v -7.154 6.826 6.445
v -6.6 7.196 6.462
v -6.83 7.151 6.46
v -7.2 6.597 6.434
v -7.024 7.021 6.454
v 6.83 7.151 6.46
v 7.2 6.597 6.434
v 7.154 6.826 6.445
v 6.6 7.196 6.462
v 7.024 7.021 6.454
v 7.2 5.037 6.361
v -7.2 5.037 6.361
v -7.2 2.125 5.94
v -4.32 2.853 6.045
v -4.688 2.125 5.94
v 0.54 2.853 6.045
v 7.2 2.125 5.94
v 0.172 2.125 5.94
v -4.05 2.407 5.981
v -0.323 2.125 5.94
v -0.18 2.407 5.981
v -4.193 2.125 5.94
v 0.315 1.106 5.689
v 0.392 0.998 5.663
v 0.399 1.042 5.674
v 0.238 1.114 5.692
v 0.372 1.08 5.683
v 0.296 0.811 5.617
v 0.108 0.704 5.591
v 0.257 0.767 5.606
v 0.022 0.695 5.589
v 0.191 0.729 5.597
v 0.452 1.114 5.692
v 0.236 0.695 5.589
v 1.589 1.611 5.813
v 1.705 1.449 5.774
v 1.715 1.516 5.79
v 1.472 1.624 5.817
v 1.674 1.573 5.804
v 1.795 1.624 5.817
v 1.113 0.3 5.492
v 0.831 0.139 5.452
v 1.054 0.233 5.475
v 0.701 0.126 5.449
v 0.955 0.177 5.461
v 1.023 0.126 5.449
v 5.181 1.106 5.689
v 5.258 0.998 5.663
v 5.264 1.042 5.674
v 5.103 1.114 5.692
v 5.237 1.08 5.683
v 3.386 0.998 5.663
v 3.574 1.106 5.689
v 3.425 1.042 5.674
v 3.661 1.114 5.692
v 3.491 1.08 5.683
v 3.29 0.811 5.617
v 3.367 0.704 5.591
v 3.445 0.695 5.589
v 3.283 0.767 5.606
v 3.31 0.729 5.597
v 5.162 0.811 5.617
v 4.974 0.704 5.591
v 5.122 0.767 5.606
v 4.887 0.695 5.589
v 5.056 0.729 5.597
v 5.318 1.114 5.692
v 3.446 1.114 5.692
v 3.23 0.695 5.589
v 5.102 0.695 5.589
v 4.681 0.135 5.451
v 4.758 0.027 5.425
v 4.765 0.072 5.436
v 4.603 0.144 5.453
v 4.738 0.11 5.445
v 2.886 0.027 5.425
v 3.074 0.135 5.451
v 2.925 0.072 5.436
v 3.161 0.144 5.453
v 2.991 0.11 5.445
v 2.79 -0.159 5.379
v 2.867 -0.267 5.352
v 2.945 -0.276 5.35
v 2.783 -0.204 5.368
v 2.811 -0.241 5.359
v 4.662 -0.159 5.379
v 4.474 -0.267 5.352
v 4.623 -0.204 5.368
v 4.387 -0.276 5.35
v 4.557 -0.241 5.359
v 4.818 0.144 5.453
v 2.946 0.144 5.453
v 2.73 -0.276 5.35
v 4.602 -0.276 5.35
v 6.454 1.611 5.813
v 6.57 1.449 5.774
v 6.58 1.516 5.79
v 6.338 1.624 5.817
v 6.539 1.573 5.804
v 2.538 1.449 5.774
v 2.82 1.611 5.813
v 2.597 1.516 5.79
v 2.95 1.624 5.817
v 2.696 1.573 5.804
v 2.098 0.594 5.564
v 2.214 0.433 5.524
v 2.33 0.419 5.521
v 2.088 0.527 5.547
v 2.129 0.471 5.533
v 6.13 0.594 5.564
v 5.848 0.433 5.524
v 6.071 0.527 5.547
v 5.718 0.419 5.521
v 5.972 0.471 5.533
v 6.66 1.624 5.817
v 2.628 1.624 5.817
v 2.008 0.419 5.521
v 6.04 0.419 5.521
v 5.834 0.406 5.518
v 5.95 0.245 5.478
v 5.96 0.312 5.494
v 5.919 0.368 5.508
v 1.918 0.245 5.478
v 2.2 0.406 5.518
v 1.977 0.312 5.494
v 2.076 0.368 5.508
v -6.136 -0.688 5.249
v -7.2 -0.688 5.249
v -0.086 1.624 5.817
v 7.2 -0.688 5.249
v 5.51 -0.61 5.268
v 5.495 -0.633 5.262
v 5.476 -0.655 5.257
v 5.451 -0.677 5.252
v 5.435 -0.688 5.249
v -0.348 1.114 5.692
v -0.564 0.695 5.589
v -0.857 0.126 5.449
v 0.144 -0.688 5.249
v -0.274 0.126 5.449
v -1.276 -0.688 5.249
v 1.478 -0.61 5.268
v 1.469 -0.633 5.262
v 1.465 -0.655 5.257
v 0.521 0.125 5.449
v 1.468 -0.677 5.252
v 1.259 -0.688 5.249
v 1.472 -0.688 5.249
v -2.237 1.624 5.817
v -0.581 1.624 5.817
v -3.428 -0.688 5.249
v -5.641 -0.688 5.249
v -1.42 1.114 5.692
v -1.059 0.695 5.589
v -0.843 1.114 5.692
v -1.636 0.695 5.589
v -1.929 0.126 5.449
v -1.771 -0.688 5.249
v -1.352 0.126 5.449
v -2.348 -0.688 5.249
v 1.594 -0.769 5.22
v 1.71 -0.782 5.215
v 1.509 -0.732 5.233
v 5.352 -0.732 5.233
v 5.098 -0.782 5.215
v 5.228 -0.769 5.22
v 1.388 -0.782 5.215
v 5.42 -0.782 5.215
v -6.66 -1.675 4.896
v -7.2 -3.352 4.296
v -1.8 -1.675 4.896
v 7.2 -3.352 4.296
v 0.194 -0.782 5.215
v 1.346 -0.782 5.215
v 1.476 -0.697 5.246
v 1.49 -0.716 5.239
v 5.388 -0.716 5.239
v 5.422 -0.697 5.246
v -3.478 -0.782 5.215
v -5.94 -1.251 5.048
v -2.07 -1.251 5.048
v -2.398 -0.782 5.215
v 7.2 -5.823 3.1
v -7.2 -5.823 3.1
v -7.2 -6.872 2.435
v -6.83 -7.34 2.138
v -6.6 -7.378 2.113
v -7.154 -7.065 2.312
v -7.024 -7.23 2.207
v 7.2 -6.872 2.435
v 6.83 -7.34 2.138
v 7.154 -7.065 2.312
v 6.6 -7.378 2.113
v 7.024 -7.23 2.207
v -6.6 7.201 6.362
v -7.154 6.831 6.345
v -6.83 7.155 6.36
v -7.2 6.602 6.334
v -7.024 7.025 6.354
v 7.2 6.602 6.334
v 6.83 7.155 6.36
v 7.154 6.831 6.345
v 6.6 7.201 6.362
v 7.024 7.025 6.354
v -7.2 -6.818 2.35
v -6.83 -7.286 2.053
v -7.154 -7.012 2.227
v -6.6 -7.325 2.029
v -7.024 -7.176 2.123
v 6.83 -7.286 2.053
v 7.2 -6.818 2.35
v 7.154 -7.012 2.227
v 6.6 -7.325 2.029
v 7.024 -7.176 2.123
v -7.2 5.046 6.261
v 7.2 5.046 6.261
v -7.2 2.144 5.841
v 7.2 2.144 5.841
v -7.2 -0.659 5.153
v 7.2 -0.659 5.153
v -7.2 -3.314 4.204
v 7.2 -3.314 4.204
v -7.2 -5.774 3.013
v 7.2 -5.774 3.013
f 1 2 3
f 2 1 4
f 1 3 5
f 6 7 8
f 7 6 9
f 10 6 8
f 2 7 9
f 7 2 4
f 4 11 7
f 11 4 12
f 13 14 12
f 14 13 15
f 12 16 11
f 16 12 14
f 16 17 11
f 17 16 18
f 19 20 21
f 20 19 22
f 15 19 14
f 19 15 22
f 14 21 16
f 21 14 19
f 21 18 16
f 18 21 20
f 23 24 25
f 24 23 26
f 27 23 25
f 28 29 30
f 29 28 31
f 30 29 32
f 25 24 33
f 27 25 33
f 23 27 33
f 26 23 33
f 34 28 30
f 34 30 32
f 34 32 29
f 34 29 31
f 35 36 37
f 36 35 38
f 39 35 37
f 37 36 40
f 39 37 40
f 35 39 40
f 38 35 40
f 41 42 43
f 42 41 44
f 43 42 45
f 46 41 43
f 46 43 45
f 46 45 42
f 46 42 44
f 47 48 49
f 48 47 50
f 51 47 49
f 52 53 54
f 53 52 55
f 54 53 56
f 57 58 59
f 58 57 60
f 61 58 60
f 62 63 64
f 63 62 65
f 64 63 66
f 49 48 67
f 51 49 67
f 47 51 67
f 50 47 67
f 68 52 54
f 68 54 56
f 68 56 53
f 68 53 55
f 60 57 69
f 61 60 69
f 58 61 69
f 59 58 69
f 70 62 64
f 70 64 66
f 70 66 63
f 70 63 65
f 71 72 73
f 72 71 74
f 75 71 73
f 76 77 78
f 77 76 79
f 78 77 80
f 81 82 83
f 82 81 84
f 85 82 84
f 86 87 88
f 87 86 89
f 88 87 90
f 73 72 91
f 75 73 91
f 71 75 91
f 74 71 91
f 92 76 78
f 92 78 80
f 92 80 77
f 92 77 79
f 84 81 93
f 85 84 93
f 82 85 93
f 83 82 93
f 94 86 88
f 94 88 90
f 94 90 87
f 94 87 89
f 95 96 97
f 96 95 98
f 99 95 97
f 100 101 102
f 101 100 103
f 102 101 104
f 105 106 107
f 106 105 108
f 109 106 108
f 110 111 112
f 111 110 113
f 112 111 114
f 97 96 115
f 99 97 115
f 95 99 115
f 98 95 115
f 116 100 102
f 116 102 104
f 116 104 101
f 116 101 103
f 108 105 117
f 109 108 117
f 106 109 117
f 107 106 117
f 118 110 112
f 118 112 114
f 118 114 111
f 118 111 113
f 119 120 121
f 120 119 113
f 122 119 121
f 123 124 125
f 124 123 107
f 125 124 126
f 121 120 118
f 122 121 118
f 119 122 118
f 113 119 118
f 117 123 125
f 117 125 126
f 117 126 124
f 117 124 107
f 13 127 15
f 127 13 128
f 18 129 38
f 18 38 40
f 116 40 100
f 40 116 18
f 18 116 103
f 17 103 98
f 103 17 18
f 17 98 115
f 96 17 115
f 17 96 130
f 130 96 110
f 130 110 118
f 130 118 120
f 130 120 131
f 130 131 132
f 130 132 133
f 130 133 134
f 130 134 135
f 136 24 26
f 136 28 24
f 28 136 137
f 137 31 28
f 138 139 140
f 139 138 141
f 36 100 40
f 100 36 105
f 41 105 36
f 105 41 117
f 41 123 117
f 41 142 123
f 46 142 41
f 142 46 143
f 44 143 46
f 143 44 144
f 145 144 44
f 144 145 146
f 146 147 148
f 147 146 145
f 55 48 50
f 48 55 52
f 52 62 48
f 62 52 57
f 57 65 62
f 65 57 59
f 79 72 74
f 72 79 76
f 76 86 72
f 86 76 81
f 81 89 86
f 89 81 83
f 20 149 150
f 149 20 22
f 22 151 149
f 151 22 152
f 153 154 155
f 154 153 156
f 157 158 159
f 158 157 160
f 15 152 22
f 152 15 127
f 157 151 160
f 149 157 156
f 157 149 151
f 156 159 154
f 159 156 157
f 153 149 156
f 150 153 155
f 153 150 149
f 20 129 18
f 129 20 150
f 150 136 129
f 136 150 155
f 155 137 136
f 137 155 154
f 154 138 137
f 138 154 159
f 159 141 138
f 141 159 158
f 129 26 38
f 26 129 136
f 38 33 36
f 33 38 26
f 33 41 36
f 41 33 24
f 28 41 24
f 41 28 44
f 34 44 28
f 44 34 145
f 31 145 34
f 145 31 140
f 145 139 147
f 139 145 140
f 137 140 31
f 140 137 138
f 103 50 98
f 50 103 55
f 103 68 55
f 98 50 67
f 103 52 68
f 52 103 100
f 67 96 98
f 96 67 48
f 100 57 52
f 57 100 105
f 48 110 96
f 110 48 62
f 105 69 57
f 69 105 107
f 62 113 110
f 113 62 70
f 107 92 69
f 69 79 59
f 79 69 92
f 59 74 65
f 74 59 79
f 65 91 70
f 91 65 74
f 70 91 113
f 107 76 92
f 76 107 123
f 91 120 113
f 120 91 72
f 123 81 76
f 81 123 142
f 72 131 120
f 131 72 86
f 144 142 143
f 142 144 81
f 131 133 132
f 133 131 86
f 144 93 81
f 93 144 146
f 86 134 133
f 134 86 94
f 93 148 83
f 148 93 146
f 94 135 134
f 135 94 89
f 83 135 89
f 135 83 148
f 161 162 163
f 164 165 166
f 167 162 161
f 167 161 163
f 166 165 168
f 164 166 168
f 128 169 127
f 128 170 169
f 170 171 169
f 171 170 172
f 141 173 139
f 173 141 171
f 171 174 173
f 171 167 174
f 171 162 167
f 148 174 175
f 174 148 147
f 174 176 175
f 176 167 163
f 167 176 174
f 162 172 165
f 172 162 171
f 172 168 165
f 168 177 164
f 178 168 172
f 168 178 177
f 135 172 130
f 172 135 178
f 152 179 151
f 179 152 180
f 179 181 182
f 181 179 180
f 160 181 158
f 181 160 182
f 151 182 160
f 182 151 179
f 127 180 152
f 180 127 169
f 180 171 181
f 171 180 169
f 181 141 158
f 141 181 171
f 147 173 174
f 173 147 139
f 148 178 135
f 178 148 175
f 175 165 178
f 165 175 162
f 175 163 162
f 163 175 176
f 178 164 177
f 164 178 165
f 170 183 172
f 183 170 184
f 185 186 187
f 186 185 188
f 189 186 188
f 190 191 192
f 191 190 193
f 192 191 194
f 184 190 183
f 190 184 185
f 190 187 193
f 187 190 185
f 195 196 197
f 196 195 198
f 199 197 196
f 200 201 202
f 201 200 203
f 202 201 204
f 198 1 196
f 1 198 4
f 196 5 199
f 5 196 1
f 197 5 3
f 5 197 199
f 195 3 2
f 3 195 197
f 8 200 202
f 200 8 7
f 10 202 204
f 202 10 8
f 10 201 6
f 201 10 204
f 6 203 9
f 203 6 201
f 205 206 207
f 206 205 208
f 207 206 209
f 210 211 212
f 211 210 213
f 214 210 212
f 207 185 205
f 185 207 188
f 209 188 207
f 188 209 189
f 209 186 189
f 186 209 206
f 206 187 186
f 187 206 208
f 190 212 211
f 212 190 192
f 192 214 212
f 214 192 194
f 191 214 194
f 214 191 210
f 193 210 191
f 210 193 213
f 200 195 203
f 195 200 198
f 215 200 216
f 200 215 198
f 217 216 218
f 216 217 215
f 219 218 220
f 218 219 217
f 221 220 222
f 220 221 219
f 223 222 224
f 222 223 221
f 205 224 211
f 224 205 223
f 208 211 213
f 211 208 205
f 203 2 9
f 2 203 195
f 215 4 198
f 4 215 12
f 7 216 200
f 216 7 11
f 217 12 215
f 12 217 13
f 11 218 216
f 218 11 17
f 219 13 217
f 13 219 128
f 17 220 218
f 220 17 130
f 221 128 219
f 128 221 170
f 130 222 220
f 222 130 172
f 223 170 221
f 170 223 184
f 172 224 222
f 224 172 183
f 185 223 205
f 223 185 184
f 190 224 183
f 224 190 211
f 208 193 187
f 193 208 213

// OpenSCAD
// file: ../p/1-4cyli.scad
use <../lib.scad>
function ldraw_lib__1_4cyli() = [
// 0 Cylinder 0.25
// 0 Name: 1-4cyli.dat
// 0 Author: James Jessiman
// 0 !LDRAW_ORG Primitive UPDATE 2012-01
// 0 !LICENSE Licensed under CC BY 4.0 : see CAreadme.txt
// 
// 0 BFC CERTIFY CCW
  [0,"BFC","CERTIFY"],
  [0,"BFC","CCW"],
// 
// 0 !HISTORY 2002-03-23 [sbliss] Added BFC statement.
// 0 !HISTORY 2002-04-25 [PTadmin] Official Update 2002-02
// 0 !HISTORY 2007-06-22 [PTadmin] Header formatted for Contributor Agreement
// 0 !HISTORY 2008-07-01 [PTadmin] Official Update 2008-01
// 0 !HISTORY 2012-02-16 [Philo] Changed to CCW
// 0 !HISTORY 2012-03-30 [PTadmin] Official Update 2012-01
// 
// 
// 4 16 1 1 0 0.9239 1 0.3827 0.9239 0 0.3827 1 0 0
  [4,16,1,1,0,0.9239,1,0.3827,0.9239,0,0.3827,1,0,0],
// 5 24 1 0 0 1 1 0 0.9239 0 0.3827 1 0 -1
  [5,24,1,0,0,1,1,0,0.9239,0,0.3827,1,0,-1],
// 4 16 0.9239 1 0.3827 0.7071 1 0.7071 0.7071 0 0.7071 0.9239 0 0.3827
  [4,16,0.9239,1,0.3827,0.7071,1,0.7071,0.7071,0,0.7071,0.9239,0,0.3827],
// 5 24 0.9239 0 0.3827 0.9239 1 0.3827 0.7071 0 0.7071 1 0 0
  [5,24,0.9239,0,0.3827,0.9239,1,0.3827,0.7071,0,0.7071,1,0,0],
// 4 16 0.7071 1 0.7071 0.3827 1 0.9239 0.3827 0 0.9239 0.7071 0 0.7071
  [4,16,0.7071,1,0.7071,0.3827,1,0.9239,0.3827,0,0.9239,0.7071,0,0.7071],
// 5 24 0.7071 0 0.7071 0.7071 1 0.7071 0.3827 0 0.9239 0.9239 0 0.3827
  [5,24,0.7071,0,0.7071,0.7071,1,0.7071,0.3827,0,0.9239,0.9239,0,0.3827],
// 4 16 0.3827 1 0.9239 0 1 1 0 0 1 0.3827 0 0.9239
  [4,16,0.3827,1,0.9239,0,1,1,0,0,1,0.3827,0,0.9239],
// 5 24 0.3827 0 0.9239 0.3827 1 0.9239 0 0 1 0.7071 0 0.7071
  [5,24,0.3827,0,0.9239,0.3827,1,0.9239,0,0,1,0.7071,0,0.7071],
// 5 24 0 0 1 0 1 1 0.3827 0 0.9239 -1 0 1
  [5,24,0,0,1,0,1,1,0.3827,0,0.9239,-1,0,1],
];
module ldraw_lib__1_4cyli(step=0, col=false, unit=2/5, alt=false, line=0.2, solid=!$preview)
    makepoly(ldraw_lib__1_4cyli(), step=step, col=col, unit=unit, alt=alt, line=line, solid=solid);
ldraw_lib__1_4cyli(line=0.2);
// file: ../p/1-8ndis.scad
use <../lib.scad>
function ldraw_lib__1_8ndis() = [
// 0 Disc Negative 0.125
// 0 Name: 1-8ndis.dat
// 0 Author: James Jessiman
// 0 !LDRAW_ORG Primitive UPDATE 2012-01
// 0 !LICENSE Licensed under CC BY 4.0 : see CAreadme.txt
// 
// 0 BFC CERTIFY CCW
  [0,"BFC","CERTIFY"],
  [0,"BFC","CCW"],
// 
// 0 !HISTORY 2002-03-23 [sbliss] Added BFC statement
// 0 !HISTORY 2002-04-25 [PTadmin] Official Update 2002-02
// 0 !HISTORY 2007-06-22 [PTadmin] Header formatted for Contributor Agreement
// 0 !HISTORY 2008-07-01 [PTadmin] Official Update 2008-01
// 0 !HISTORY 2012-02-16 [Philo] Changed to CCW
// 0 !HISTORY 2012-03-30 [PTadmin] Official Update 2012-01
// 
// 
// 3 16 0.9239 0 0.3827 1 0 0 1 0 1
  [3,16,0.9239,0,0.3827,1,0,0,1,0,1],
// 3 16 0.7071 0 0.7071 0.9239 0 0.3827 1 0 1
  [3,16,0.7071,0,0.7071,0.9239,0,0.3827,1,0,1],
];
module ldraw_lib__1_8ndis(step=0, col=false, unit=2/5, alt=false, line=0.2, solid=!$preview)
    makepoly(ldraw_lib__1_8ndis(), step=step, col=col, unit=unit, alt=alt, line=line, solid=solid);
ldraw_lib__1_8ndis(line=0.2);
// file: ../p/1-8chrd.scad
use <../lib.scad>
function ldraw_lib__1_8chrd() = [
// 0 Chord 0.125
// 0 Name: 1-8chrd.dat
// 0 Author: Orion Pobursky [OrionP]
// 0 !LDRAW_ORG Primitive UPDATE 2023-05
// 0 !LICENSE Licensed under CC BY 4.0 : see CAreadme.txt
// 
// 0 BFC CERTIFY CCW
  [0,"BFC","CERTIFY"],
  [0,"BFC","CCW"],
// 
// 0 !HISTORY 2004-04-22 [PTadmin] Official Update 2004-02
// 0 !HISTORY 2007-06-22 [PTadmin] Header formatted for Contributor Agreement
// 0 !HISTORY 2008-07-01 [PTadmin] Official Update 2008-01
// 0 !HISTORY 2023-10-27 [OrionP] Rebuilt with PrimGen2, original author westrate
// 0 !HISTORY 2023-10-31 [OrionP] Official Update 2023-05
// 
// 3 16 1 0 0 0.9239 0 0.3827 0.7071 0 0.7071
  [3,16,1,0,0,0.9239,0,0.3827,0.7071,0,0.7071],
];
module ldraw_lib__1_8chrd(step=0, col=false, unit=2/5, alt=false, line=0.2, solid=!$preview)
    makepoly(ldraw_lib__1_8chrd(), step=step, col=col, unit=unit, alt=alt, line=line, solid=solid);
ldraw_lib__1_8chrd(line=0.2);
// file: ../p/1-4ndis.scad
use <../lib.scad>
function ldraw_lib__1_4ndis() = [
// 0 Disc Negative 0.25
// 0 Name: 1-4ndis.dat
// 0 Author: James Jessiman
// 0 !LDRAW_ORG Primitive UPDATE 2012-01
// 0 !LICENSE Licensed under CC BY 4.0 : see CAreadme.txt
// 
// 0 BFC CERTIFY CCW
  [0,"BFC","CERTIFY"],
  [0,"BFC","CCW"],
// 
// 0 !HISTORY 2002-03-23 [sbliss] Added BFC Statement
// 0 !HISTORY 2002-04-25 [PTadmin] Official Update 2002-02
// 0 !HISTORY 2007-06-22 [PTadmin] Header formatted for Contributor Agreement
// 0 !HISTORY 2008-07-01 [PTadmin] Official Update 2008-01
// 0 !HISTORY 2012-02-16 [Philo] Changed to CCW
// 0 !HISTORY 2012-03-30 [PTadmin] Official Update 2012-01
// 
// 
// 3 16 0.9239 0 0.3827 1 0 0 1 0 1
  [3,16,0.9239,0,0.3827,1,0,0,1,0,1],
// 3 16 0.7071 0 0.7071 0.9239 0 0.3827 1 0 1
  [3,16,0.7071,0,0.7071,0.9239,0,0.3827,1,0,1],
// 3 16 0.3827 0 0.9239 0.7071 0 0.7071 1 0 1
  [3,16,0.3827,0,0.9239,0.7071,0,0.7071,1,0,1],
// 3 16 0 0 1 0.3827 0 0.9239 1 0 1
  [3,16,0,0,1,0.3827,0,0.9239,1,0,1],
];
module ldraw_lib__1_4ndis(step=0, col=false, unit=2/5, alt=false, line=0.2, solid=!$preview)
    makepoly(ldraw_lib__1_4ndis(), step=step, col=col, unit=unit, alt=alt, line=line, solid=solid);
ldraw_lib__1_4ndis(line=0.2);
// file: ../p/1-4chrd.scad
use <../lib.scad>
function ldraw_lib__1_4chrd() = [
// 0 Chord 0.25
// 0 Name: 1-4chrd.dat
// 0 Author: Max Martin Richter [MMR1988]
// 0 !LDRAW_ORG Primitive UPDATE 2023-05
// 0 !LICENSE Licensed under CC BY 4.0 : see CAreadme.txt
// 
// 0 BFC CERTIFY CCW
  [0,"BFC","CERTIFY"],
  [0,"BFC","CCW"],
// 
// 0 !HISTORY 2004-04-22 [PTadmin] Official Update 2004-02
// 0 !HISTORY 2007-10-09 [PTadmin] Header formatted for Contributor Agreement
// 0 !HISTORY 2008-07-01 [PTadmin] Official Update 2008-01
// 0 !HISTORY 2012-08-02 [MMR1988] Re-creation with PrimGen2 and Rectifier
// 0 !HISTORY 2012-08-09 [PTadmin] Official Update 2012-02
// 0 !HISTORY 2023-10-27 [OrionP] Change author to MMR1988 from hafhead
// 0 !HISTORY 2023-10-31 [OrionP] Official Update 2023-05
// 
// 4 16 0.9239 0 0.3827 0.3827 0 0.9239 0 0 1 1 0 0
  [4,16,0.9239,0,0.3827,0.3827,0,0.9239,0,0,1,1,0,0],
// 3 16 0.7071 0 0.7071 0.3827 0 0.9239 0.9239 0 0.3827
  [3,16,0.7071,0,0.7071,0.3827,0,0.9239,0.9239,0,0.3827],
];
module ldraw_lib__1_4chrd(step=0, col=false, unit=2/5, alt=false, line=0.2, solid=!$preview)
    makepoly(ldraw_lib__1_4chrd(), step=step, col=col, unit=unit, alt=alt, line=line, solid=solid);
ldraw_lib__1_4chrd(line=0.2);
// file: s/6142271fs05.scad
use <../../lib.scad>
use <../../p/1-4chrd.scad>
function ldraw_lib__s__6142271fs05() = [
// 0 ~Sticker  1.9 x  .8 with Red and White R8 Logo on Black Background - Sixth Face
// 0 Name: s\6142271fs05.dat
// 0 Author: Massimo Maso [Sirio]
// 0 !LDRAW_ORG Subpart UPDATE 2025-02
// 0 !LICENSE Licensed under CC BY 4.0 : see CAreadme.txt
// 
// 0 BFC CERTIFY CCW
  [0,"BFC","CERTIFY"],
  [0,"BFC","CCW"],
// 
// 0 !HISTORY 2025-02-27 [OrionP] Official Update 2025-02
// 
// 
// 0 // Primitives
// 1 0 -16.5 -.25 -3.0901 -1.5 0 0 0 1 0 0 0 -1.5 1-4chrd.dat
  [1,0,-16.5,-.25,-3.0901,-1.5,0,0,0,1,0,0,0,-1.5, ldraw_lib__1_4chrd()],
// 1 0 16.5 -.25 -3.0901 1.5 0 0 0 1 0 0 0 -1.5 1-4chrd.dat
  [1,0,16.5,-.25,-3.0901,1.5,0,0,0,1,0,0,0,-1.5, ldraw_lib__1_4chrd()],
// 0 // Black faces
// 4 0 -18 -.25 -3.0901 18 -.25 -3.0901 18 -.25 .0144 -18 -.25 .0144
  [4,0,-18,-.25,-3.0901,18,-.25,-3.0901,18,-.25,.0144,-18,-.25,.0144],
// 4 0 -18 -.25 -3.0901 -16.5 -.25 -4.5901 16.5 -.25 -4.5901 18 -.25 -3.0901
  [4,0,-18,-.25,-3.0901,-16.5,-.25,-4.5901,16.5,-.25,-4.5901,18,-.25,-3.0901],
];
module ldraw_lib__s__6142271fs05(step=0, col=false, unit=2/5, alt=false, line=0.2, solid=!$preview)
    makepoly(ldraw_lib__s__6142271fs05(), step=step, col=col, unit=unit, alt=alt, line=line, solid=solid);
ldraw_lib__s__6142271fs05(line=0.2);
// file: s/6142271fs04.scad
use <../../lib.scad>
use <../../p/1-8chrd.scad>
use <../../p/1-8ndis.scad>
function ldraw_lib__s__6142271fs04() = [
// 0 ~Sticker  1.9 x  .8 with Red and White R8 Logo on Black Background -  Fourth Face
// 0 Name: s\6142271fs04.dat
// 0 Author: Massimo Maso [Sirio]
// 0 !LDRAW_ORG Subpart UPDATE 2025-02
// 0 !LICENSE Licensed under CC BY 4.0 : see CAreadme.txt
// 
// 0 BFC CERTIFY CCW
  [0,"BFC","CERTIFY"],
  [0,"BFC","CCW"],
// 
// 0 !HISTORY 2025-02-27 [OrionP] Official Update 2025-02
// 
// 
// 0 // Primitives
// 1 15 4.5 -.25 .21322 -.225 0 -.8055 0 1 0 -.45 0 0 1-8chrd.dat
  [1,15,4.5,-.25,.21322,-.225,0,-.8055,0,1,0,-.45,0,0, ldraw_lib__1_8chrd()],
// 1 15 12.969 -.25 .21322 -.225 0 .8055 0 1 0 -.45 0 0 1-8chrd.dat
  [1,15,12.969,-.25,.21322,-.225,0,.8055,0,1,0,-.45,0,0, ldraw_lib__1_8chrd()],
// 1 0 4.5 -.25 .21322 -.225 0 -.8055 0 1 0 -.45 0 0 1-8ndis.dat
  [1,0,4.5,-.25,.21322,-.225,0,-.8055,0,1,0,-.45,0,0, ldraw_lib__1_8ndis()],
// 1 0 12.969 -.25 .21322 -.225 0 .8055 0 1 0 -.45 0 0 1-8ndis.dat
  [1,0,12.969,-.25,.21322,-.225,0,.8055,0,1,0,-.45,0,0, ldraw_lib__1_8ndis()],
// 0 // Black faces
// 3 0 -18 -.25 .0128 -16.65 -.25 -2.6072 -15.34 -.25 .0128
  [3,0,-18,-.25,.0128,-16.65,-.25,-2.6072,-15.34,-.25,.0128],
// 3 0 -18 -.25 .0128 -18 -.25 -7.061 -16.65 -.25 -2.6072
  [3,0,-18,-.25,.0128,-18,-.25,-7.061,-16.65,-.25,-2.6072],
// 4 0 18 -.25 -7.061 -4.5 -.25 -2.6072 -16.65 -.25 -2.6072 -18 -.25 -7.061
  [4,0,18,-.25,-7.061,-4.5,-.25,-2.6072,-16.65,-.25,-2.6072,-18,-.25,-7.061],
// 4 0 -4.5 -.25 -2.6072 .486 -.25 -.23678 .3612 -.25 .0128 -3.19 -.25 .0128
  [4,0,-4.5,-.25,-2.6072,.486,-.25,-.23678,.3612,-.25,.0128,-3.19,-.25,.0128],
// 3 0 -4.5 -.25 -2.6072 3.366 -.25 -.23678 .486 -.25 -.23678
  [3,0,-4.5,-.25,-2.6072,3.366,-.25,-.23678,.486,-.25,-.23678],
// 3 0 -4.5 -.25 -2.6072 3.4695 -.25 -.23678 3.366 -.25 -.23678
  [3,0,-4.5,-.25,-2.6072,3.4695,-.25,-.23678,3.366,-.25,-.23678],
// 3 0 -4.5 -.25 -2.6072 4.275 -.25 -.23678 3.4695 -.25 -.23678
  [3,0,-4.5,-.25,-2.6072,4.275,-.25,-.23678,3.4695,-.25,-.23678],
// 4 0 3.366 -.25 -.23678 3.6899 -.25 -.0118 3.6805 -.25 .0128 3.1463 -.25 .0128
  [4,0,3.366,-.25,-.23678,3.6899,-.25,-.0118,3.6805,-.25,.0128,3.1463,-.25,.0128],
// 3 0 3.366 -.25 -.23678 3.7239 -.25 -.0607 3.6899 -.25 -.0118
  [3,0,3.366,-.25,-.23678,3.7239,-.25,-.0607,3.6899,-.25,-.0118],
// 4 0 3.366 -.25 -.23678 3.4695 -.25 -.23678 3.77133345 -.25 -.104975 3.7239 -.25 -.0607
  [4,0,3.366,-.25,-.23678,3.4695,-.25,-.23678,3.77133345,-.25,-.104975,3.7239,-.25,-.0607],
// 4 0 18 -.25 -7.061 12.744 -.25 -.23678 4.275 -.25 -.23678 -4.5 -.25 -2.6072
  [4,0,18,-.25,-7.061,12.744,-.25,-.23678,4.275,-.25,-.23678,-4.5,-.25,-2.6072],
// 3 0 18 -.25 -7.061 13.5495 -.25 -.23678 12.744 -.25 -.23678
  [3,0,18,-.25,-7.061,13.5495,-.25,-.23678,12.744,-.25,-.23678],
// 3 0 13.5495 -.25 -.23678 13.4711 -.25 -.0607 13.37947155 -.25 -.104975
  [3,0,13.5495,-.25,-.23678,13.4711,-.25,-.0607,13.37947155,-.25,-.104975],
// 4 0 13.5495 -.25 -.23678 18 -.25 -7.061 13.5541 -.25 -.0118 13.4711 -.25 -.0607
  [4,0,13.5495,-.25,-.23678,18,-.25,-7.061,13.5541,-.25,-.0118,13.4711,-.25,-.0607],
// 4 0 18 -.25 -7.061 18 -.25 .0128 13.5881 -.25 .0128 13.5541 -.25 -.0118
  [4,0,18,-.25,-7.061,18,-.25,.0128,13.5881,-.25,.0128,13.5541,-.25,-.0118],
// 0 // Red faces
// 4 4 -14.85 -.25 -1.4822 -8.694 -.25 -.2372 -8.5692 -.25 .0128 -14.1025 -.25 .0128
  [4,4,-14.85,-.25,-1.4822,-8.694,-.25,-.2372,-8.5692,-.25,.0128,-14.1025,-.25,.0128],
// 4 4 -14.85 -.25 -1.4822 -5.175 -.25 -1.4822 -5.994 -.25 -.2372 -8.694 -.25 -.2372
  [4,4,-14.85,-.25,-1.4822,-5.175,-.25,-1.4822,-5.994,-.25,-.2372,-8.694,-.25,-.2372],
// 4 4 -5.994 -.25 -.2372 -5.175 -.25 -1.4822 -4.4275 -.25 .0128 -5.8692 -.25 .0128
  [4,4,-5.994,-.25,-.2372,-5.175,-.25,-1.4822,-4.4275,-.25,.0128,-5.8692,-.25,.0128],
// 0 // White faces
// 4 15 -5.994 -.25 -.2372 -5.8692 -.25 .0128 -8.5692 -.25 .0128 -8.694 -.25 -.2372
  [4,15,-5.994,-.25,-.2372,-5.8692,-.25,.0128,-8.5692,-.25,.0128,-8.694,-.25,-.2372],
// 4 15 -14.85 -.25 -1.4822 -14.1025 -.25 .0128 -15.34 -.25 .0128 -16.65 -.25 -2.6072
  [4,15,-14.85,-.25,-1.4822,-14.1025,-.25,.0128,-15.34,-.25,.0128,-16.65,-.25,-2.6072],
// 4 15 -14.85 -.25 -1.4822 -16.65 -.25 -2.6072 -4.5 -.25 -2.6072 -5.175 -.25 -1.4822
  [4,15,-14.85,-.25,-1.4822,-16.65,-.25,-2.6072,-4.5,-.25,-2.6072,-5.175,-.25,-1.4822],
// 4 15 -4.5 -.25 -2.6072 -3.19 -.25 .0128 -4.4275 -.25 .0128 -5.175 -.25 -1.4822
  [4,15,-4.5,-.25,-2.6072,-3.19,-.25,.0128,-4.4275,-.25,.0128,-5.175,-.25,-1.4822],
// 4 15 .3612 -.25 .0128 .486 -.25 -.23678 3.366 -.25 -.23678 3.1463 -.25 .0128
  [4,15,.3612,-.25,.0128,.486,-.25,-.23678,3.366,-.25,-.23678,3.1463,-.25,.0128],
// 4 15 3.6899 -.25 -.0118 13.5541 -.25 -.0118 13.5881 -.25 .0128 3.6805 -.25 .0128
  [4,15,3.6899,-.25,-.0118,13.5541,-.25,-.0118,13.5881,-.25,.0128,3.6805,-.25,.0128],
// 4 15 3.6899 -.25 -.0118 4.275 -.25 -.23678 12.744 -.25 -.23678 13.5541 -.25 -.0118
  [4,15,3.6899,-.25,-.0118,4.275,-.25,-.23678,12.744,-.25,-.23678,13.5541,-.25,-.0118],
// 4 15 4.275 -.25 -.23678 3.6899 -.25 -.0118 3.7239 -.25 -.0607 3.77133345 -.25 -.104975
  [4,15,4.275,-.25,-.23678,3.6899,-.25,-.0118,3.7239,-.25,-.0607,3.77133345,-.25,-.104975],
// 4 15 12.744 -.25 -.23678 13.37947155 -.25 -.104975 13.4711 -.25 -.0607 13.5541 -.25 -.0118
  [4,15,12.744,-.25,-.23678,13.37947155,-.25,-.104975,13.4711,-.25,-.0607,13.5541,-.25,-.0118],
];
module ldraw_lib__s__6142271fs04(step=0, col=false, unit=2/5, alt=false, line=0.2, solid=!$preview)
    makepoly(ldraw_lib__s__6142271fs04(), step=step, col=col, unit=unit, alt=alt, line=line, solid=solid);
ldraw_lib__s__6142271fs04(line=0.2);
// file: s/6142271fs02.scad
use <../../lib.scad>
function ldraw_lib__s__6142271fs02() = [
// 0 ~Sticker  1.9 x  .8 with Red and White R8 Logo on Black Background -  Second Face
// 0 Name: s\6142271fs02.dat
// 0 Author: Massimo Maso [Sirio]
// 0 !LDRAW_ORG Subpart UPDATE 2025-02
// 0 !LICENSE Licensed under CC BY 4.0 : see CAreadme.txt
// 
// 0 BFC CERTIFY CCW
  [0,"BFC","CERTIFY"],
  [0,"BFC","CCW"],
// 
// 0 !HISTORY 2025-02-27 [OrionP] Official Update 2025-02
// 
// 
// 0 // Black faces
// 4 0 -18 -.25 .0121 -18 -.25 -7.3435 -11.7194 -.25 -7.3435 -10.8 -.25 -5.5047
  [4,0,-18,-.25,.0121,-18,-.25,-7.3435,-11.7194,-.25,-7.3435,-10.8,-.25,-5.5047],
// 4 0 -18 -.25 .0121 -10.8 -.25 -5.5047 1.35 -.25 -5.5047 18 -.25 .0121
  [4,0,-18,-.25,.0121,-10.8,-.25,-5.5047,1.35,-.25,-5.5047,18,-.25,.0121],
// 4 0 18 -.25 .0121 1.35 -.25 -5.5047 .4306 -.25 -7.3435 18 -.25 -7.3435
  [4,0,18,-.25,.0121,1.35,-.25,-5.5047,.4306,-.25,-7.3435,18,-.25,-7.3435],
// 0 // Red face
// 4 4 -10.125 -.25 -6.6297 -10.4819 -.25 -7.3435 -.8069 -.25 -7.3435 -.45 -.25 -6.6297
  [4,4,-10.125,-.25,-6.6297,-10.4819,-.25,-7.3435,-.8069,-.25,-7.3435,-.45,-.25,-6.6297],
// 0 // White faces
// 4 15 -10.125 -.25 -6.6297 -10.8 -.25 -5.5047 -11.7194 -.25 -7.3435 -10.4819 -.25 -7.3435
  [4,15,-10.125,-.25,-6.6297,-10.8,-.25,-5.5047,-11.7194,-.25,-7.3435,-10.4819,-.25,-7.3435],
// 4 15 -.45 -.25 -6.6297 1.35 -.25 -5.5047 -10.8 -.25 -5.5047 -10.125 -.25 -6.6297
  [4,15,-.45,-.25,-6.6297,1.35,-.25,-5.5047,-10.8,-.25,-5.5047,-10.125,-.25,-6.6297],
// 4 15 -.45 -.25 -6.6297 -.8069 -.25 -7.3435 .4306 -.25 -7.3435 1.35 -.25 -5.5047
  [4,15,-.45,-.25,-6.6297,-.8069,-.25,-7.3435,.4306,-.25,-7.3435,1.35,-.25,-5.5047],
];
module ldraw_lib__s__6142271fs02(step=0, col=false, unit=2/5, alt=false, line=0.2, solid=!$preview)
    makepoly(ldraw_lib__s__6142271fs02(), step=step, col=col, unit=unit, alt=alt, line=line, solid=solid);
ldraw_lib__s__6142271fs02(line=0.2);
// file: s/6142271fs01.scad
use <../../lib.scad>
use <../../p/1-4chrd.scad>
function ldraw_lib__s__6142271fs01() = [
// 0 ~Sticker  1.9 x  .8 with Red and White R8 Logo on Black Background - First Face
// 0 Name: s\6142271fs01.dat
// 0 Author: Massimo Maso [Sirio]
// 0 !LDRAW_ORG Subpart UPDATE 2025-02
// 0 !LICENSE Licensed under CC BY 4.0 : see CAreadme.txt
// 
// 0 BFC CERTIFY CCW
  [0,"BFC","CERTIFY"],
  [0,"BFC","CCW"],
// 
// 0 !HISTORY 2025-02-27 [OrionP] Official Update 2025-02
// 
// 
// 0 // Primitives
// 1 0 -16.5 -.25 3.8922 -1.5 0 0 0 1 0 0 0 1.5 1-4chrd.dat
  [1,0,-16.5,-.25,3.8922,-1.5,0,0,0,1,0,0,0,1.5, ldraw_lib__1_4chrd()],
// 1 0 16.5 -.25 3.8922 1.5 0 0 0 1 0 0 0 1.5 1-4chrd.dat
  [1,0,16.5,-.25,3.8922,1.5,0,0,0,1,0,0,0,1.5, ldraw_lib__1_4chrd()],
// 0 // Black faces
// 4 0 -18 -.25 3.8922 18 -.25 3.8922 16.5 -.25 5.3922 -16.5 -.25 5.3922
  [4,0,-18,-.25,3.8922,18,-.25,3.8922,16.5,-.25,5.3922,-16.5,-.25,5.3922],
// 4 0 -18 -.25 3.8922 -18 -.25 -.0121 18 -.25 -.0121 18 -.25 3.8922
  [4,0,-18,-.25,3.8922,-18,-.25,-.0121,18,-.25,-.0121,18,-.25,3.8922],
];
module ldraw_lib__s__6142271fs01(step=0, col=false, unit=2/5, alt=false, line=0.2, solid=!$preview)
    makepoly(ldraw_lib__s__6142271fs01(), step=step, col=col, unit=unit, alt=alt, line=line, solid=solid);
ldraw_lib__s__6142271fs01(line=0.2);
// main file
use <../lib.scad>
use <s/6142271fs01.scad>
use <s/6142271fs02.scad>
use <s/6142271fs03.scad>
use <s/6142271fs04.scad>
use <s/6142271fs05.scad>
use <s/6142271fs07.scad>
function ldraw_lib__6142271fc01() = [
// 0 Sticker  1.9 x  1.8 with Red and White R8 Logo on Black Background (Formed)
// 0 Name: 6142271fc01.dat
// 0 Author: Massimo Maso [Sirio]
// 0 !LDRAW_ORG Part UPDATE 2025-02
// 0 !LICENSE Licensed under CC BY 4.0 : see CAreadme.txt
// 
// 0 BFC CERTIFY CCW
  [0,"BFC","CERTIFY"],
  [0,"BFC","CCW"],
// 
// 0 !KEYWORDS Audi, Bricklink 75873stk01a, Brickowl 427960, LMS, Rebrickable 24755
// 0 !KEYWORDS Set 75873, Speed Champions, Ultra
// 
// 0 !HISTORY 2025-02-27 [OrionP] Official Update 2025-02
// 
// 
// 1 16 0 -15.6524 12.616 1 0 0 0 .998894 -.047023 0 .047023 .998894 s\6142271fs01.dat
  [1,16,0,-15.6524,12.616,1,0,0,0,.998894,-.047023,0,.047023,.998894, ldraw_lib__s__6142271fs01()],
// 1 16 0 -15.6524 12.616 1 0 0 0 .989715 -.143056 0 .143056 .989715 s\6142271fs02.dat
  [1,16,0,-15.6524,12.616,1,0,0,0,.989715,-.143056,0,.143056,.989715, ldraw_lib__s__6142271fs02()],
// 1 16 0 -12.8827 -1.648 1 0 0 0 .971148 -.238478 0 .238478 .971148 s\6142271fs03.dat
  [1,16,0,-12.8827,-1.648,1,0,0,0,.971148,-.238478,0,.238478,.971148, ldraw_lib__s__6142271fs03()],
// 1 16 0 -12.8827 -1.648 1 0 0 0 .941616 -.336689 0 .336689 .941616 s\6142271fs04.dat
  [1,16,0,-12.8827,-1.648,1,0,0,0,.941616,-.336689,0,.336689,.941616, ldraw_lib__s__6142271fs04()],
// 4 0 -18 -10.7408 -8.3808 -18 -7.7504 -14.5579 18 -7.7504 -14.5579 18 -10.7408 -8.3808
  [4,0,-18,-10.7408,-8.3808,-18,-7.7504,-14.5579,18,-7.7504,-14.5579,18,-10.7408,-8.3808],
// 1 16 0 -7.5316 -14.436 1 0 0 0 .844289 -.535889 0 .535889 .844289 s\6142271fs05.dat
  [1,16,0,-7.5316,-14.436,1,0,0,0,.844289,-.535889,0,.535889,.844289, ldraw_lib__s__6142271fs05()],
// 1 16 0 0 0 1 0 0 0 1 0 0 0 1 s\6142271fs07.dat
  [1,16,0,0,0,1,0,0,0,1,0,0,0,1, ldraw_lib__s__6142271fs07()],
];
module ldraw_lib__6142271fc01(step=0, col=false, unit=2/5, alt=false, line=0.2, solid=!$preview)
    makepoly(ldraw_lib__6142271fc01(), step=step, col=col, unit=unit, alt=alt, line=line, solid=solid);
ldraw_lib__6142271fc01(line=0.2);
